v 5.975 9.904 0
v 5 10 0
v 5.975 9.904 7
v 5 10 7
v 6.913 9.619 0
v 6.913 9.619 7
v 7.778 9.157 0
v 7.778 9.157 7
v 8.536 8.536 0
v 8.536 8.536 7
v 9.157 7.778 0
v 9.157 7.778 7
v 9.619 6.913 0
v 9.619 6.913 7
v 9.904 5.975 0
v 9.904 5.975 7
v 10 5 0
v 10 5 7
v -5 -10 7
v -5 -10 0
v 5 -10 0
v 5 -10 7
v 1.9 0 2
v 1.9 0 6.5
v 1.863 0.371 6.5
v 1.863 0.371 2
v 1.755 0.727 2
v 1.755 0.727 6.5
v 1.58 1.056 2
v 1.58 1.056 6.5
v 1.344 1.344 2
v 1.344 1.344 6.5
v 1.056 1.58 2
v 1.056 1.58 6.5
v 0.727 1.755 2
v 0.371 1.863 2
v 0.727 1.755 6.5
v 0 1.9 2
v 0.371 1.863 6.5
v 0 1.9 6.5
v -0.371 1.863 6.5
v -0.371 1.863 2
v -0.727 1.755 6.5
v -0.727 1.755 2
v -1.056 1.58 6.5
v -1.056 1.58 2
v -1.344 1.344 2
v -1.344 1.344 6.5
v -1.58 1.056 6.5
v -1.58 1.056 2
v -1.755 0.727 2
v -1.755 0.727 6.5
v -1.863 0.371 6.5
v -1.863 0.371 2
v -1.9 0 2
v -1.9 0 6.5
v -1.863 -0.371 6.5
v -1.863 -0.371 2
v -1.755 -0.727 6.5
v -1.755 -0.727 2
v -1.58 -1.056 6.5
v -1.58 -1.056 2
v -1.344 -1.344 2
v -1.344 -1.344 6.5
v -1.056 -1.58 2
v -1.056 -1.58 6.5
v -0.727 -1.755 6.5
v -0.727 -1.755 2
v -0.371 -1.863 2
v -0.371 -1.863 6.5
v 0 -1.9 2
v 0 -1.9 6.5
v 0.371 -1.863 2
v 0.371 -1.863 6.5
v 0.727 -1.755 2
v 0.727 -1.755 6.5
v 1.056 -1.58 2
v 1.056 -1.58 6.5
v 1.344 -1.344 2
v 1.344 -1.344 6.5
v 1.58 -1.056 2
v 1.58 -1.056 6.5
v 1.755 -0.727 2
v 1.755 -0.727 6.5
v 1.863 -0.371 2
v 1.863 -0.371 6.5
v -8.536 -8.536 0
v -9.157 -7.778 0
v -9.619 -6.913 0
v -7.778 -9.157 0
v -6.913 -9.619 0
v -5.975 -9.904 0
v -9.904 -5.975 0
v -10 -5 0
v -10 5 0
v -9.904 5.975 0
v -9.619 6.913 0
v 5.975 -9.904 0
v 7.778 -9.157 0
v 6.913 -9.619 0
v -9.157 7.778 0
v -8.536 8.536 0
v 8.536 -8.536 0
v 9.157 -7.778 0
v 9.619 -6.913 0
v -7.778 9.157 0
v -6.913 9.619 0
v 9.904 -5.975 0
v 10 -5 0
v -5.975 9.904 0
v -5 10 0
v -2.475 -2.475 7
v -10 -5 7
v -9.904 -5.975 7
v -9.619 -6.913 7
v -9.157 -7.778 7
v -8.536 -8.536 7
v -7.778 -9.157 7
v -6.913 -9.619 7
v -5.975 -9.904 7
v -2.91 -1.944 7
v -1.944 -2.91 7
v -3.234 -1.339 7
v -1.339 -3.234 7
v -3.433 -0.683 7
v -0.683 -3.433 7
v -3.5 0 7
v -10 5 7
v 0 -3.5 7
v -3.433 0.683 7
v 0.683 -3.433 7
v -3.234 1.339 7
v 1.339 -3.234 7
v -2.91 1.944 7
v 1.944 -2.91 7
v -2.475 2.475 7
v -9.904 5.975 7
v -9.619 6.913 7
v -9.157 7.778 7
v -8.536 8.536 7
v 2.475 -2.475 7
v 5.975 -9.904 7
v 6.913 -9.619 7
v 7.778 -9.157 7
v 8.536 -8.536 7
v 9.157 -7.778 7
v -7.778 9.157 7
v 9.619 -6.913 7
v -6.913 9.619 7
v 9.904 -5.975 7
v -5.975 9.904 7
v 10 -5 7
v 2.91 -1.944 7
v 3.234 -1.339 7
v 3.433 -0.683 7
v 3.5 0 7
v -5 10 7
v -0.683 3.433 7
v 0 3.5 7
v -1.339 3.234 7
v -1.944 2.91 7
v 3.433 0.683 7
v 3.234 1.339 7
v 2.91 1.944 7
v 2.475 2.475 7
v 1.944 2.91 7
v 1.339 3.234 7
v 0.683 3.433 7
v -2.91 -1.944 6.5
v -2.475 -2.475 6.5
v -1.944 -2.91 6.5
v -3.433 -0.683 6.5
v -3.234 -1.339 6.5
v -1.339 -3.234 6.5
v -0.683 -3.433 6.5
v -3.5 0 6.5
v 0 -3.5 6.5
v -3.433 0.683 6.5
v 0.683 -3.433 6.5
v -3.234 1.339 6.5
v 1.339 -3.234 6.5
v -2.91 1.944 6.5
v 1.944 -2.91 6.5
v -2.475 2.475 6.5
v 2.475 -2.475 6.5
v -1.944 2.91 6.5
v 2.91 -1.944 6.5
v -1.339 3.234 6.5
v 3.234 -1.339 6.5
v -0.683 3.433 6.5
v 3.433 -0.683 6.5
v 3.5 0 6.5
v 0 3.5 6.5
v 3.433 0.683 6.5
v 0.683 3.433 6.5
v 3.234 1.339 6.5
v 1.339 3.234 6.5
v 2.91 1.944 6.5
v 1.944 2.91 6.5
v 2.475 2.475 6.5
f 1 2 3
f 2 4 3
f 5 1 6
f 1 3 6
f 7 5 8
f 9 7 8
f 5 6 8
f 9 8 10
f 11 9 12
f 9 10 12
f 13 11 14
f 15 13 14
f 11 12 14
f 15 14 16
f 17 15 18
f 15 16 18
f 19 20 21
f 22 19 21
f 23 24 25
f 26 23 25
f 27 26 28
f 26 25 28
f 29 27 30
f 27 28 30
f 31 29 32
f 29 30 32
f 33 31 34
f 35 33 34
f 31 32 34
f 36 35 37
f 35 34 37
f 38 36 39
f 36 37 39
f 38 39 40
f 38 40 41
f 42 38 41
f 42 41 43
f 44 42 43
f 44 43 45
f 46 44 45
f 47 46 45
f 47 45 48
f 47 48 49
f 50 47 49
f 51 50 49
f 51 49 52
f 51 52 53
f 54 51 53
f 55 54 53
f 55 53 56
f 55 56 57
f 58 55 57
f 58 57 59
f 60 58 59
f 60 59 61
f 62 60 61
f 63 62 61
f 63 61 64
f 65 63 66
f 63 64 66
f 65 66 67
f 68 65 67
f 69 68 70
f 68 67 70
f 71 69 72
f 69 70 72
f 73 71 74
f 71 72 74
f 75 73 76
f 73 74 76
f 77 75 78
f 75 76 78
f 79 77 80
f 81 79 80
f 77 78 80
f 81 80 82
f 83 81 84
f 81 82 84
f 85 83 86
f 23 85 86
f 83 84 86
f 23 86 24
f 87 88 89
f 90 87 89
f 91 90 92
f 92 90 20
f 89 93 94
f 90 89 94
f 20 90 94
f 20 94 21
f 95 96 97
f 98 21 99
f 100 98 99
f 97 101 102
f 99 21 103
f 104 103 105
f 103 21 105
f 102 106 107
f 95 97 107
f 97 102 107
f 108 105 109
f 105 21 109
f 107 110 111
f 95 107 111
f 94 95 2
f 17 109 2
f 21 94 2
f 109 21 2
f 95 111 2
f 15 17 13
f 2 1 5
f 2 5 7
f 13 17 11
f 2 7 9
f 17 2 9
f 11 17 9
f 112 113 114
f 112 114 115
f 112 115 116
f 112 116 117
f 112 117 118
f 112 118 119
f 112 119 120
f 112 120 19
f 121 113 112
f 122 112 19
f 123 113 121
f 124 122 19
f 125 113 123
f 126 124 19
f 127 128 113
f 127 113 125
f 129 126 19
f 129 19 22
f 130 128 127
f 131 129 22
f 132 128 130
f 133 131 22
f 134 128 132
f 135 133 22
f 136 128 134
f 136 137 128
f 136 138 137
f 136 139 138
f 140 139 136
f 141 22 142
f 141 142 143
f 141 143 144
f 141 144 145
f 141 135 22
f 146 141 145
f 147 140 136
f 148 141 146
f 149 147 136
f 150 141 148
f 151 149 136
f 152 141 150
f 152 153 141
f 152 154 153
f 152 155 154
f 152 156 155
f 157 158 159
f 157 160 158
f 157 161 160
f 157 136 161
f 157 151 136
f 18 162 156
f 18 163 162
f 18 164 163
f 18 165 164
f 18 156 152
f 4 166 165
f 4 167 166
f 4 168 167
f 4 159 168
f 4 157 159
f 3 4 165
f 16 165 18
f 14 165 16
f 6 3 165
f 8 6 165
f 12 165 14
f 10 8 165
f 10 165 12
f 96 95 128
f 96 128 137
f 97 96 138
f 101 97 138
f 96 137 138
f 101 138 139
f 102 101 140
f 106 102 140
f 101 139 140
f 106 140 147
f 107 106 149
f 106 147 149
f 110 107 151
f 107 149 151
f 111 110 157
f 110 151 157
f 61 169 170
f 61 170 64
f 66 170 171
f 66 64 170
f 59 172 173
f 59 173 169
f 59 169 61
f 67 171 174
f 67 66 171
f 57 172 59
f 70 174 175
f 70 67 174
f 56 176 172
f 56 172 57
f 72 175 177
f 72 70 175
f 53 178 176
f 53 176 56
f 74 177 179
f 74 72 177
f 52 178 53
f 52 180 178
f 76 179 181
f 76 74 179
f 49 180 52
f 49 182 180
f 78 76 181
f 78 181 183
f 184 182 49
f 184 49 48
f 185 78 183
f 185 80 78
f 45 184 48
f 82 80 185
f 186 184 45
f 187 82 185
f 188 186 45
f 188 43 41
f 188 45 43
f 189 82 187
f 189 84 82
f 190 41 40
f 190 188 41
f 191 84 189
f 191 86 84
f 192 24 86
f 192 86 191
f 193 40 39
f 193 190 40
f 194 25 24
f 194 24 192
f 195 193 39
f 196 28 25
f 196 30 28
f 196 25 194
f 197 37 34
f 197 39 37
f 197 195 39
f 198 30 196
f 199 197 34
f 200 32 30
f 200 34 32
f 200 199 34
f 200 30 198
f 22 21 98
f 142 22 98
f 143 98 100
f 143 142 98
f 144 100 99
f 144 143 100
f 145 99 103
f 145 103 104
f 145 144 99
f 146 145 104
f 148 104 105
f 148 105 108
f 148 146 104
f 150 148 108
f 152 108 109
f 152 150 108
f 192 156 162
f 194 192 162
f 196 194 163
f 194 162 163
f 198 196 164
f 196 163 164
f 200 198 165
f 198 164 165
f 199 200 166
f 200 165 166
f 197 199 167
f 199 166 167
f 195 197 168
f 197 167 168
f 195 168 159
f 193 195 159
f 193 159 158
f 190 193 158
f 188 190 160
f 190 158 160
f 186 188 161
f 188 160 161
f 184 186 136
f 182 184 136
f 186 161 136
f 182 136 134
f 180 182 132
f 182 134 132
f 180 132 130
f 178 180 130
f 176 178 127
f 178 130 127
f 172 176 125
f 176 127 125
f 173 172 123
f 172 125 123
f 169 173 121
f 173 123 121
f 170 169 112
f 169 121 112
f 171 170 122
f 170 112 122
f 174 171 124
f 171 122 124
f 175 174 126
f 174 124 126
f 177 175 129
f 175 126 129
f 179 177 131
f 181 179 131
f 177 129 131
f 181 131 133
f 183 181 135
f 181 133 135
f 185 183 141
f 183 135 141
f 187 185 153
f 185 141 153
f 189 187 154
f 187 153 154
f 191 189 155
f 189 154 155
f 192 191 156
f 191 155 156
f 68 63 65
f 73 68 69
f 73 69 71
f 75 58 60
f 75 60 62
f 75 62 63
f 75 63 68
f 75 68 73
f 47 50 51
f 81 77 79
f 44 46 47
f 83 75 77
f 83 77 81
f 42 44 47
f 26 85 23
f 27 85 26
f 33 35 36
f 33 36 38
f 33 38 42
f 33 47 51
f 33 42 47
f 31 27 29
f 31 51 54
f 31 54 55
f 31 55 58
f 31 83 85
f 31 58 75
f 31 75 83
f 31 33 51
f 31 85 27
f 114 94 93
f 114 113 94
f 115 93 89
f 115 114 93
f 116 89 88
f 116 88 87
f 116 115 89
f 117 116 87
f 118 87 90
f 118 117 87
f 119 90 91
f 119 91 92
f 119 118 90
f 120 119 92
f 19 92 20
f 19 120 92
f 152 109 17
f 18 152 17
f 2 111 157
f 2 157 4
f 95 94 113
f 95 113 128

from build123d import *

# Parameters (mm, degrees)
F0_W     = 20
F0_H     = 20
F1_DEPTH = 7
F2_R     = 1.9
F3_DEPTH = 5
F4_R     = 3.5
F5_DEPTH = 0.5
F6_R     = 5


with BuildPart() as f1:
    # F0 (on Top) → F1 (new body)
    with BuildSketch(Plane.XY):
        Rectangle(F0_W, F0_H)
    extrude(amount=F1_DEPTH)

    # F2 (on face) → F3 (cut)
    with BuildSketch(Plane.XY.offset(7)):
        Circle(F2_R)
    extrude(amount=-F3_DEPTH, mode=Mode.SUBTRACT)

    # F4 (on face) → F5 (cut)
    with BuildSketch(Plane.XY.offset(7)):
        Circle(F4_R)
    extrude(amount=-F5_DEPTH, mode=Mode.SUBTRACT)

    # F6
    f6_edges = [f1.edges().sort_by_distance(p)[0] for p in [
        (-10, -10, 3.5),
        (10, -10, 3.5),
        (10, 10, 3.5),
        (-10, 10, 3.5),
    ]]
    fillet(f6_edges, radius=F6_R)


solid = f1.part
